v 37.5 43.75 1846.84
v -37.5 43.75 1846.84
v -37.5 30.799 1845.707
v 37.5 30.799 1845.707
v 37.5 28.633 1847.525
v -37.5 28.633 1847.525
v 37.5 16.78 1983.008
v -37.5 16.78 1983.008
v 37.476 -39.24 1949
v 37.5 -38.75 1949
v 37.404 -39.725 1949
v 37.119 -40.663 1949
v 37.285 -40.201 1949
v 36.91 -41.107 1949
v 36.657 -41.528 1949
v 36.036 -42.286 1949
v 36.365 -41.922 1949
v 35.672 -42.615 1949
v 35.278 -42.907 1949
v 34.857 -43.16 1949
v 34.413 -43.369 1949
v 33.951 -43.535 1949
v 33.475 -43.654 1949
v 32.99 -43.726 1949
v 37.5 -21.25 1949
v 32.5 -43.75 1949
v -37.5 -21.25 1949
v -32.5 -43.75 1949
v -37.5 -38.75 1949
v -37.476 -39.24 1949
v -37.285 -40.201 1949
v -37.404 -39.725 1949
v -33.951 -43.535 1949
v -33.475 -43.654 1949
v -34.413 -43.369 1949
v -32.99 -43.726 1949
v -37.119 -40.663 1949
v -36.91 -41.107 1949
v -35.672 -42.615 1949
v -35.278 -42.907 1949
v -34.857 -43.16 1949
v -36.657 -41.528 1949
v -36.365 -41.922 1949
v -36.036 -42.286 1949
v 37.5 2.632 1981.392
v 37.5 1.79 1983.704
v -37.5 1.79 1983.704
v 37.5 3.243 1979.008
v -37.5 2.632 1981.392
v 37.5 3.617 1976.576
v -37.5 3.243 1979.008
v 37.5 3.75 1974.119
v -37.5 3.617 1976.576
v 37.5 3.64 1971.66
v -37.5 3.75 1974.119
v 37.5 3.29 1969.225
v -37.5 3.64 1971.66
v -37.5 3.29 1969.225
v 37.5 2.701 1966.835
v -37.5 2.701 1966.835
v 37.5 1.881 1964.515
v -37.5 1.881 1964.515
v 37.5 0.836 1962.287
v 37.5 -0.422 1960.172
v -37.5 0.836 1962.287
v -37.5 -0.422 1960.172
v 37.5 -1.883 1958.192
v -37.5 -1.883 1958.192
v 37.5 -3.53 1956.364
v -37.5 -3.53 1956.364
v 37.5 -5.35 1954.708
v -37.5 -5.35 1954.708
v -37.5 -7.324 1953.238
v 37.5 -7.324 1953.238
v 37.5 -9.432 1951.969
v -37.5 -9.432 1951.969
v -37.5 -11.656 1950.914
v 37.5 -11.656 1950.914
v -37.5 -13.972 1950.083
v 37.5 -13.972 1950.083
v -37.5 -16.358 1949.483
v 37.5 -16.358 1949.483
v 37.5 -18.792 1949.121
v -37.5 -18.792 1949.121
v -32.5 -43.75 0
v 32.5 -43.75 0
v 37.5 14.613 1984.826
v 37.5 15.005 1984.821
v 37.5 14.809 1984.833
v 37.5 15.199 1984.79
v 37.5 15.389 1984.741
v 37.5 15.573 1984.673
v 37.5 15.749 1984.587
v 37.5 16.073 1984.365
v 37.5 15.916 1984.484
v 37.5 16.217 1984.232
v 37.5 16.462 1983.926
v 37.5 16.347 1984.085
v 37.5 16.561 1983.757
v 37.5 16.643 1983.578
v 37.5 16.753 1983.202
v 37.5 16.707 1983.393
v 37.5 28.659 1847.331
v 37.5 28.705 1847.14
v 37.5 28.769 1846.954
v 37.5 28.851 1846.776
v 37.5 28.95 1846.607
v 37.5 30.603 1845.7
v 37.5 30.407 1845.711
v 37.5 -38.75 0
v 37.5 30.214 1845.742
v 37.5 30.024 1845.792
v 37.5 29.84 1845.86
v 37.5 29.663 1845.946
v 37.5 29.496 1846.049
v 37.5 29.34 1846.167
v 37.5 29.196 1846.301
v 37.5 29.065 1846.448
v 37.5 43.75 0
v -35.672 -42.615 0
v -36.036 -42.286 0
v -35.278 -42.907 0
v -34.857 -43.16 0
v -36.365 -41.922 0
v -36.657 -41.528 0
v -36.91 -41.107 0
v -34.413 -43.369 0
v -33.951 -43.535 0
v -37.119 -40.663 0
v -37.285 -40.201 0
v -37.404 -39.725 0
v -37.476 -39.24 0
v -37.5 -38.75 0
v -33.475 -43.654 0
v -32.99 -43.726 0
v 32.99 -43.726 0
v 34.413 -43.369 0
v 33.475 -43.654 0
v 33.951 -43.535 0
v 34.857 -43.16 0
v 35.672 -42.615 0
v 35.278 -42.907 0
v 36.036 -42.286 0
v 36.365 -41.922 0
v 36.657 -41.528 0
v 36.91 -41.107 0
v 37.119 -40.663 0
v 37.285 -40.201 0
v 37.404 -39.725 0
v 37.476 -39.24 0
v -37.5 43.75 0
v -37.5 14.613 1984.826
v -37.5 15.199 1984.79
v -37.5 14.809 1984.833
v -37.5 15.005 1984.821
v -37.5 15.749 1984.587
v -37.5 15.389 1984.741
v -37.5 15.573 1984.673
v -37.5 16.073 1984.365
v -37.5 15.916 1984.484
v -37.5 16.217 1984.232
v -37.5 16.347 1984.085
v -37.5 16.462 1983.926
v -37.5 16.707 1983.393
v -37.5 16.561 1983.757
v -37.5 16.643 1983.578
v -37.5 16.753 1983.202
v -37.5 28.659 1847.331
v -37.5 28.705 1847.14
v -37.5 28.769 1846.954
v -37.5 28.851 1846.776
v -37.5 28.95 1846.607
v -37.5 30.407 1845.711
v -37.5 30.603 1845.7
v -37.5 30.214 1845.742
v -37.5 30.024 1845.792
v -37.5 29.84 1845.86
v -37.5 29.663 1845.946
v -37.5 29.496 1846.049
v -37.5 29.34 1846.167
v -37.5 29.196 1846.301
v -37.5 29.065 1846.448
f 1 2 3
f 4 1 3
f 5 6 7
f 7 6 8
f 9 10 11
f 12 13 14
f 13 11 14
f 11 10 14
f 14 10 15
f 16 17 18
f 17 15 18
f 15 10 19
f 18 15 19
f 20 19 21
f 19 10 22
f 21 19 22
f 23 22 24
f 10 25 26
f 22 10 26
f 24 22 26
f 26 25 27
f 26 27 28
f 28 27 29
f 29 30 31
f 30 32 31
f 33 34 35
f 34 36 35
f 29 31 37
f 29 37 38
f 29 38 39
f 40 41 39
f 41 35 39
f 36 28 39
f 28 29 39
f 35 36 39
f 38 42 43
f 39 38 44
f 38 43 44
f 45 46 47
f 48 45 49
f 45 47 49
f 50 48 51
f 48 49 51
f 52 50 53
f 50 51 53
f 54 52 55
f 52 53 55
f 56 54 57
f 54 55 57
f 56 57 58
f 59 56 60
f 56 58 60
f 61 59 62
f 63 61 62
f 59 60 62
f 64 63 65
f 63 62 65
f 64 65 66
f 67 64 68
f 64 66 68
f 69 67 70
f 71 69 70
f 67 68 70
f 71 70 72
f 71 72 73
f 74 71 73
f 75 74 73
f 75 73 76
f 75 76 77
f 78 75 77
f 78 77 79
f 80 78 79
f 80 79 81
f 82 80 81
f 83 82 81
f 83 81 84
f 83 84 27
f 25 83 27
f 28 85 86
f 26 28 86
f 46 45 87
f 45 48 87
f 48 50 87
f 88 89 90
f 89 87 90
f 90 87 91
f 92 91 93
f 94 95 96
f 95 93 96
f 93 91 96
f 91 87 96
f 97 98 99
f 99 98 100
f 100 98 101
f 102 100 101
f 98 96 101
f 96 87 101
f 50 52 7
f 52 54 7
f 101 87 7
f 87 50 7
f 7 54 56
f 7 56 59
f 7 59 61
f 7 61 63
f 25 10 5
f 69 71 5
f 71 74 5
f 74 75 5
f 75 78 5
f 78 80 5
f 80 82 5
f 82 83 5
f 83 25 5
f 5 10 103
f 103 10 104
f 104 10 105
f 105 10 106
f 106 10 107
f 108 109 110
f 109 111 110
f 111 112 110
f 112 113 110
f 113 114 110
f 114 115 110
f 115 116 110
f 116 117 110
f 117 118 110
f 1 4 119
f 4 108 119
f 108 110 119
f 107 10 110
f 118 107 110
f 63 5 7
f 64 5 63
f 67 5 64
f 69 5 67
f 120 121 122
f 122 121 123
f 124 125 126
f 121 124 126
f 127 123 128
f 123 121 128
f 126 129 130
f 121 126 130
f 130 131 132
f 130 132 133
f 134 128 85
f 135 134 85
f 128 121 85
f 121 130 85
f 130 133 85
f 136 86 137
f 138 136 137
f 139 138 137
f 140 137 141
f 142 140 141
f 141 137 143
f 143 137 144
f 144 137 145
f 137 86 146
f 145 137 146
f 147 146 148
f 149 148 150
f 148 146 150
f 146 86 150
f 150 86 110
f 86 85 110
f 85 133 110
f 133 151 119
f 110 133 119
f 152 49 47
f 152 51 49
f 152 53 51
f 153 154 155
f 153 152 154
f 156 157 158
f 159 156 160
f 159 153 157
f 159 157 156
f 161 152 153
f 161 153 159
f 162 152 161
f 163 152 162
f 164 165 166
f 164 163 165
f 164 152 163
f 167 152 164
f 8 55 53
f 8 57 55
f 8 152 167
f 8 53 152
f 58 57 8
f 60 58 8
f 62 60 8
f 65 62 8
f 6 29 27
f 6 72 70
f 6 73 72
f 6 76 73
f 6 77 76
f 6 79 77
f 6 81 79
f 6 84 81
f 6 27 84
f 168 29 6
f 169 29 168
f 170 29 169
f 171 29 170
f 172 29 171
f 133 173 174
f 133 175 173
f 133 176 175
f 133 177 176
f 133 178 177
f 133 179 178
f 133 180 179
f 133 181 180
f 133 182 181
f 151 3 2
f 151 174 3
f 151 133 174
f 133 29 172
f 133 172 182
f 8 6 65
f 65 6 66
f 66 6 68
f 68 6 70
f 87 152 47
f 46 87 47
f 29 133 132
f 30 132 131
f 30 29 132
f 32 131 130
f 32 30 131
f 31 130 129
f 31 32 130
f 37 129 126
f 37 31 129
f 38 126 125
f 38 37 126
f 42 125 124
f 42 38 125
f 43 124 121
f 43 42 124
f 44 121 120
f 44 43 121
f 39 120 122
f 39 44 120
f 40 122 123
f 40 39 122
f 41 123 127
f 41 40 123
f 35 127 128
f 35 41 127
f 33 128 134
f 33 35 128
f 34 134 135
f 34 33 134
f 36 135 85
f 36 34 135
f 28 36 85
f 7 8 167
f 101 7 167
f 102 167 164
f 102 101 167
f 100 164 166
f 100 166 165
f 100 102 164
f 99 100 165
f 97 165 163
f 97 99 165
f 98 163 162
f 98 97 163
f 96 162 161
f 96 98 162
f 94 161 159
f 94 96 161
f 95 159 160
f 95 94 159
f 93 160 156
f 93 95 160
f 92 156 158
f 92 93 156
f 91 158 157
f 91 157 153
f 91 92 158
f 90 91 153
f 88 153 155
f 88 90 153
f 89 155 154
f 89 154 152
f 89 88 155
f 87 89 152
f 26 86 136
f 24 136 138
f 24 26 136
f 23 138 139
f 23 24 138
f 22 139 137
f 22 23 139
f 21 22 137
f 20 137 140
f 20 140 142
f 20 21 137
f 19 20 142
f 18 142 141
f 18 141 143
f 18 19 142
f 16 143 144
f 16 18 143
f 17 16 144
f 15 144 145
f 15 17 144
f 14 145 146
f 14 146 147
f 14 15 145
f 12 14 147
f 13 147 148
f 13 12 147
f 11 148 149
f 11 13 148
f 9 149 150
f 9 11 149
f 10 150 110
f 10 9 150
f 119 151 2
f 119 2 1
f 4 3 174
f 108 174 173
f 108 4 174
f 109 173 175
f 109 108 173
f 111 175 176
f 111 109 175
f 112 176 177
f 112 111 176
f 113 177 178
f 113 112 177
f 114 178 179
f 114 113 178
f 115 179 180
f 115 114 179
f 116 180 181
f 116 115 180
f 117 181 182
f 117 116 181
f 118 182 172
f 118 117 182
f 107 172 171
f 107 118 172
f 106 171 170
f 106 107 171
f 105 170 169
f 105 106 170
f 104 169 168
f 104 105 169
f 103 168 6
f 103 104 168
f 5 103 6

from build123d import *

# Parameters (mm, degrees)
F0_W     = 75
F0_H     = 87.5
F1_DEPTH = 2000
F2_R     = 5
F3_W     = 5
F3_H     = 51
F4_DEPTH = 75.001
F5_R     = 2


# Not quite as in the source:
# - a feature names something its author has since deleted; it is built from what else it names


with BuildPart() as f1:
    # F0 (on Top) → F1 (new body)
    with BuildSketch(Plane.XY):
        Rectangle(F0_W, F0_H)
    extrude(amount=F1_DEPTH)

    # F2
    f2_edges = [f1.edges().sort_by_distance(p)[0] for p in [
        (-37.5, -43.75, 1000),
        (37.5, -43.75, 1000),
    ]]
    fillet(f2_edges, radius=F2_R)

    # F3 (on face) → F4 (cut, through all)
    with BuildSketch(Plane(origin=(-37.5, 0, 0), x_dir=(0, -1, 0), z_dir=(-1, 0, 0))):
        with BuildLine():
            Line((-28.8070795286, 1845.5327422672), (-16.605275544, 1985))
            Line((-16.605275544, 1985), (-1.7898756174, 1983.7038204608))
            ThreePointArc((-1.7898756174, 1983.7038204608), (0.4221879267, 1960.172410035), (21.25, 1949))
            Line((21.25, 1949), (38.75, 1949))
            Line((38.75, 1949), (38.75, 2000))
            Line((38.75, 2000), (-43.75, 2000))
            Line((-43.75, 2000), (-43.75, 1846.8400784084))
            Line((-43.75, 1846.8400784084), (-28.8070795286, 1845.5327422672))
        make_face()
        with Locations((41.25, 1974.5)):
            Rectangle(F3_W, F3_H)
    extrude(amount=-F4_DEPTH, mode=Mode.SUBTRACT)

    # F5
    f5_edges = [f1.edges().sort_by_distance(p)[0] for p in [
        (0, 16.605276, 1985),
        (0, 28.80708, 1845.532742),
    ]]
    fillet(f5_edges, radius=F5_R)


solid = f1.part
